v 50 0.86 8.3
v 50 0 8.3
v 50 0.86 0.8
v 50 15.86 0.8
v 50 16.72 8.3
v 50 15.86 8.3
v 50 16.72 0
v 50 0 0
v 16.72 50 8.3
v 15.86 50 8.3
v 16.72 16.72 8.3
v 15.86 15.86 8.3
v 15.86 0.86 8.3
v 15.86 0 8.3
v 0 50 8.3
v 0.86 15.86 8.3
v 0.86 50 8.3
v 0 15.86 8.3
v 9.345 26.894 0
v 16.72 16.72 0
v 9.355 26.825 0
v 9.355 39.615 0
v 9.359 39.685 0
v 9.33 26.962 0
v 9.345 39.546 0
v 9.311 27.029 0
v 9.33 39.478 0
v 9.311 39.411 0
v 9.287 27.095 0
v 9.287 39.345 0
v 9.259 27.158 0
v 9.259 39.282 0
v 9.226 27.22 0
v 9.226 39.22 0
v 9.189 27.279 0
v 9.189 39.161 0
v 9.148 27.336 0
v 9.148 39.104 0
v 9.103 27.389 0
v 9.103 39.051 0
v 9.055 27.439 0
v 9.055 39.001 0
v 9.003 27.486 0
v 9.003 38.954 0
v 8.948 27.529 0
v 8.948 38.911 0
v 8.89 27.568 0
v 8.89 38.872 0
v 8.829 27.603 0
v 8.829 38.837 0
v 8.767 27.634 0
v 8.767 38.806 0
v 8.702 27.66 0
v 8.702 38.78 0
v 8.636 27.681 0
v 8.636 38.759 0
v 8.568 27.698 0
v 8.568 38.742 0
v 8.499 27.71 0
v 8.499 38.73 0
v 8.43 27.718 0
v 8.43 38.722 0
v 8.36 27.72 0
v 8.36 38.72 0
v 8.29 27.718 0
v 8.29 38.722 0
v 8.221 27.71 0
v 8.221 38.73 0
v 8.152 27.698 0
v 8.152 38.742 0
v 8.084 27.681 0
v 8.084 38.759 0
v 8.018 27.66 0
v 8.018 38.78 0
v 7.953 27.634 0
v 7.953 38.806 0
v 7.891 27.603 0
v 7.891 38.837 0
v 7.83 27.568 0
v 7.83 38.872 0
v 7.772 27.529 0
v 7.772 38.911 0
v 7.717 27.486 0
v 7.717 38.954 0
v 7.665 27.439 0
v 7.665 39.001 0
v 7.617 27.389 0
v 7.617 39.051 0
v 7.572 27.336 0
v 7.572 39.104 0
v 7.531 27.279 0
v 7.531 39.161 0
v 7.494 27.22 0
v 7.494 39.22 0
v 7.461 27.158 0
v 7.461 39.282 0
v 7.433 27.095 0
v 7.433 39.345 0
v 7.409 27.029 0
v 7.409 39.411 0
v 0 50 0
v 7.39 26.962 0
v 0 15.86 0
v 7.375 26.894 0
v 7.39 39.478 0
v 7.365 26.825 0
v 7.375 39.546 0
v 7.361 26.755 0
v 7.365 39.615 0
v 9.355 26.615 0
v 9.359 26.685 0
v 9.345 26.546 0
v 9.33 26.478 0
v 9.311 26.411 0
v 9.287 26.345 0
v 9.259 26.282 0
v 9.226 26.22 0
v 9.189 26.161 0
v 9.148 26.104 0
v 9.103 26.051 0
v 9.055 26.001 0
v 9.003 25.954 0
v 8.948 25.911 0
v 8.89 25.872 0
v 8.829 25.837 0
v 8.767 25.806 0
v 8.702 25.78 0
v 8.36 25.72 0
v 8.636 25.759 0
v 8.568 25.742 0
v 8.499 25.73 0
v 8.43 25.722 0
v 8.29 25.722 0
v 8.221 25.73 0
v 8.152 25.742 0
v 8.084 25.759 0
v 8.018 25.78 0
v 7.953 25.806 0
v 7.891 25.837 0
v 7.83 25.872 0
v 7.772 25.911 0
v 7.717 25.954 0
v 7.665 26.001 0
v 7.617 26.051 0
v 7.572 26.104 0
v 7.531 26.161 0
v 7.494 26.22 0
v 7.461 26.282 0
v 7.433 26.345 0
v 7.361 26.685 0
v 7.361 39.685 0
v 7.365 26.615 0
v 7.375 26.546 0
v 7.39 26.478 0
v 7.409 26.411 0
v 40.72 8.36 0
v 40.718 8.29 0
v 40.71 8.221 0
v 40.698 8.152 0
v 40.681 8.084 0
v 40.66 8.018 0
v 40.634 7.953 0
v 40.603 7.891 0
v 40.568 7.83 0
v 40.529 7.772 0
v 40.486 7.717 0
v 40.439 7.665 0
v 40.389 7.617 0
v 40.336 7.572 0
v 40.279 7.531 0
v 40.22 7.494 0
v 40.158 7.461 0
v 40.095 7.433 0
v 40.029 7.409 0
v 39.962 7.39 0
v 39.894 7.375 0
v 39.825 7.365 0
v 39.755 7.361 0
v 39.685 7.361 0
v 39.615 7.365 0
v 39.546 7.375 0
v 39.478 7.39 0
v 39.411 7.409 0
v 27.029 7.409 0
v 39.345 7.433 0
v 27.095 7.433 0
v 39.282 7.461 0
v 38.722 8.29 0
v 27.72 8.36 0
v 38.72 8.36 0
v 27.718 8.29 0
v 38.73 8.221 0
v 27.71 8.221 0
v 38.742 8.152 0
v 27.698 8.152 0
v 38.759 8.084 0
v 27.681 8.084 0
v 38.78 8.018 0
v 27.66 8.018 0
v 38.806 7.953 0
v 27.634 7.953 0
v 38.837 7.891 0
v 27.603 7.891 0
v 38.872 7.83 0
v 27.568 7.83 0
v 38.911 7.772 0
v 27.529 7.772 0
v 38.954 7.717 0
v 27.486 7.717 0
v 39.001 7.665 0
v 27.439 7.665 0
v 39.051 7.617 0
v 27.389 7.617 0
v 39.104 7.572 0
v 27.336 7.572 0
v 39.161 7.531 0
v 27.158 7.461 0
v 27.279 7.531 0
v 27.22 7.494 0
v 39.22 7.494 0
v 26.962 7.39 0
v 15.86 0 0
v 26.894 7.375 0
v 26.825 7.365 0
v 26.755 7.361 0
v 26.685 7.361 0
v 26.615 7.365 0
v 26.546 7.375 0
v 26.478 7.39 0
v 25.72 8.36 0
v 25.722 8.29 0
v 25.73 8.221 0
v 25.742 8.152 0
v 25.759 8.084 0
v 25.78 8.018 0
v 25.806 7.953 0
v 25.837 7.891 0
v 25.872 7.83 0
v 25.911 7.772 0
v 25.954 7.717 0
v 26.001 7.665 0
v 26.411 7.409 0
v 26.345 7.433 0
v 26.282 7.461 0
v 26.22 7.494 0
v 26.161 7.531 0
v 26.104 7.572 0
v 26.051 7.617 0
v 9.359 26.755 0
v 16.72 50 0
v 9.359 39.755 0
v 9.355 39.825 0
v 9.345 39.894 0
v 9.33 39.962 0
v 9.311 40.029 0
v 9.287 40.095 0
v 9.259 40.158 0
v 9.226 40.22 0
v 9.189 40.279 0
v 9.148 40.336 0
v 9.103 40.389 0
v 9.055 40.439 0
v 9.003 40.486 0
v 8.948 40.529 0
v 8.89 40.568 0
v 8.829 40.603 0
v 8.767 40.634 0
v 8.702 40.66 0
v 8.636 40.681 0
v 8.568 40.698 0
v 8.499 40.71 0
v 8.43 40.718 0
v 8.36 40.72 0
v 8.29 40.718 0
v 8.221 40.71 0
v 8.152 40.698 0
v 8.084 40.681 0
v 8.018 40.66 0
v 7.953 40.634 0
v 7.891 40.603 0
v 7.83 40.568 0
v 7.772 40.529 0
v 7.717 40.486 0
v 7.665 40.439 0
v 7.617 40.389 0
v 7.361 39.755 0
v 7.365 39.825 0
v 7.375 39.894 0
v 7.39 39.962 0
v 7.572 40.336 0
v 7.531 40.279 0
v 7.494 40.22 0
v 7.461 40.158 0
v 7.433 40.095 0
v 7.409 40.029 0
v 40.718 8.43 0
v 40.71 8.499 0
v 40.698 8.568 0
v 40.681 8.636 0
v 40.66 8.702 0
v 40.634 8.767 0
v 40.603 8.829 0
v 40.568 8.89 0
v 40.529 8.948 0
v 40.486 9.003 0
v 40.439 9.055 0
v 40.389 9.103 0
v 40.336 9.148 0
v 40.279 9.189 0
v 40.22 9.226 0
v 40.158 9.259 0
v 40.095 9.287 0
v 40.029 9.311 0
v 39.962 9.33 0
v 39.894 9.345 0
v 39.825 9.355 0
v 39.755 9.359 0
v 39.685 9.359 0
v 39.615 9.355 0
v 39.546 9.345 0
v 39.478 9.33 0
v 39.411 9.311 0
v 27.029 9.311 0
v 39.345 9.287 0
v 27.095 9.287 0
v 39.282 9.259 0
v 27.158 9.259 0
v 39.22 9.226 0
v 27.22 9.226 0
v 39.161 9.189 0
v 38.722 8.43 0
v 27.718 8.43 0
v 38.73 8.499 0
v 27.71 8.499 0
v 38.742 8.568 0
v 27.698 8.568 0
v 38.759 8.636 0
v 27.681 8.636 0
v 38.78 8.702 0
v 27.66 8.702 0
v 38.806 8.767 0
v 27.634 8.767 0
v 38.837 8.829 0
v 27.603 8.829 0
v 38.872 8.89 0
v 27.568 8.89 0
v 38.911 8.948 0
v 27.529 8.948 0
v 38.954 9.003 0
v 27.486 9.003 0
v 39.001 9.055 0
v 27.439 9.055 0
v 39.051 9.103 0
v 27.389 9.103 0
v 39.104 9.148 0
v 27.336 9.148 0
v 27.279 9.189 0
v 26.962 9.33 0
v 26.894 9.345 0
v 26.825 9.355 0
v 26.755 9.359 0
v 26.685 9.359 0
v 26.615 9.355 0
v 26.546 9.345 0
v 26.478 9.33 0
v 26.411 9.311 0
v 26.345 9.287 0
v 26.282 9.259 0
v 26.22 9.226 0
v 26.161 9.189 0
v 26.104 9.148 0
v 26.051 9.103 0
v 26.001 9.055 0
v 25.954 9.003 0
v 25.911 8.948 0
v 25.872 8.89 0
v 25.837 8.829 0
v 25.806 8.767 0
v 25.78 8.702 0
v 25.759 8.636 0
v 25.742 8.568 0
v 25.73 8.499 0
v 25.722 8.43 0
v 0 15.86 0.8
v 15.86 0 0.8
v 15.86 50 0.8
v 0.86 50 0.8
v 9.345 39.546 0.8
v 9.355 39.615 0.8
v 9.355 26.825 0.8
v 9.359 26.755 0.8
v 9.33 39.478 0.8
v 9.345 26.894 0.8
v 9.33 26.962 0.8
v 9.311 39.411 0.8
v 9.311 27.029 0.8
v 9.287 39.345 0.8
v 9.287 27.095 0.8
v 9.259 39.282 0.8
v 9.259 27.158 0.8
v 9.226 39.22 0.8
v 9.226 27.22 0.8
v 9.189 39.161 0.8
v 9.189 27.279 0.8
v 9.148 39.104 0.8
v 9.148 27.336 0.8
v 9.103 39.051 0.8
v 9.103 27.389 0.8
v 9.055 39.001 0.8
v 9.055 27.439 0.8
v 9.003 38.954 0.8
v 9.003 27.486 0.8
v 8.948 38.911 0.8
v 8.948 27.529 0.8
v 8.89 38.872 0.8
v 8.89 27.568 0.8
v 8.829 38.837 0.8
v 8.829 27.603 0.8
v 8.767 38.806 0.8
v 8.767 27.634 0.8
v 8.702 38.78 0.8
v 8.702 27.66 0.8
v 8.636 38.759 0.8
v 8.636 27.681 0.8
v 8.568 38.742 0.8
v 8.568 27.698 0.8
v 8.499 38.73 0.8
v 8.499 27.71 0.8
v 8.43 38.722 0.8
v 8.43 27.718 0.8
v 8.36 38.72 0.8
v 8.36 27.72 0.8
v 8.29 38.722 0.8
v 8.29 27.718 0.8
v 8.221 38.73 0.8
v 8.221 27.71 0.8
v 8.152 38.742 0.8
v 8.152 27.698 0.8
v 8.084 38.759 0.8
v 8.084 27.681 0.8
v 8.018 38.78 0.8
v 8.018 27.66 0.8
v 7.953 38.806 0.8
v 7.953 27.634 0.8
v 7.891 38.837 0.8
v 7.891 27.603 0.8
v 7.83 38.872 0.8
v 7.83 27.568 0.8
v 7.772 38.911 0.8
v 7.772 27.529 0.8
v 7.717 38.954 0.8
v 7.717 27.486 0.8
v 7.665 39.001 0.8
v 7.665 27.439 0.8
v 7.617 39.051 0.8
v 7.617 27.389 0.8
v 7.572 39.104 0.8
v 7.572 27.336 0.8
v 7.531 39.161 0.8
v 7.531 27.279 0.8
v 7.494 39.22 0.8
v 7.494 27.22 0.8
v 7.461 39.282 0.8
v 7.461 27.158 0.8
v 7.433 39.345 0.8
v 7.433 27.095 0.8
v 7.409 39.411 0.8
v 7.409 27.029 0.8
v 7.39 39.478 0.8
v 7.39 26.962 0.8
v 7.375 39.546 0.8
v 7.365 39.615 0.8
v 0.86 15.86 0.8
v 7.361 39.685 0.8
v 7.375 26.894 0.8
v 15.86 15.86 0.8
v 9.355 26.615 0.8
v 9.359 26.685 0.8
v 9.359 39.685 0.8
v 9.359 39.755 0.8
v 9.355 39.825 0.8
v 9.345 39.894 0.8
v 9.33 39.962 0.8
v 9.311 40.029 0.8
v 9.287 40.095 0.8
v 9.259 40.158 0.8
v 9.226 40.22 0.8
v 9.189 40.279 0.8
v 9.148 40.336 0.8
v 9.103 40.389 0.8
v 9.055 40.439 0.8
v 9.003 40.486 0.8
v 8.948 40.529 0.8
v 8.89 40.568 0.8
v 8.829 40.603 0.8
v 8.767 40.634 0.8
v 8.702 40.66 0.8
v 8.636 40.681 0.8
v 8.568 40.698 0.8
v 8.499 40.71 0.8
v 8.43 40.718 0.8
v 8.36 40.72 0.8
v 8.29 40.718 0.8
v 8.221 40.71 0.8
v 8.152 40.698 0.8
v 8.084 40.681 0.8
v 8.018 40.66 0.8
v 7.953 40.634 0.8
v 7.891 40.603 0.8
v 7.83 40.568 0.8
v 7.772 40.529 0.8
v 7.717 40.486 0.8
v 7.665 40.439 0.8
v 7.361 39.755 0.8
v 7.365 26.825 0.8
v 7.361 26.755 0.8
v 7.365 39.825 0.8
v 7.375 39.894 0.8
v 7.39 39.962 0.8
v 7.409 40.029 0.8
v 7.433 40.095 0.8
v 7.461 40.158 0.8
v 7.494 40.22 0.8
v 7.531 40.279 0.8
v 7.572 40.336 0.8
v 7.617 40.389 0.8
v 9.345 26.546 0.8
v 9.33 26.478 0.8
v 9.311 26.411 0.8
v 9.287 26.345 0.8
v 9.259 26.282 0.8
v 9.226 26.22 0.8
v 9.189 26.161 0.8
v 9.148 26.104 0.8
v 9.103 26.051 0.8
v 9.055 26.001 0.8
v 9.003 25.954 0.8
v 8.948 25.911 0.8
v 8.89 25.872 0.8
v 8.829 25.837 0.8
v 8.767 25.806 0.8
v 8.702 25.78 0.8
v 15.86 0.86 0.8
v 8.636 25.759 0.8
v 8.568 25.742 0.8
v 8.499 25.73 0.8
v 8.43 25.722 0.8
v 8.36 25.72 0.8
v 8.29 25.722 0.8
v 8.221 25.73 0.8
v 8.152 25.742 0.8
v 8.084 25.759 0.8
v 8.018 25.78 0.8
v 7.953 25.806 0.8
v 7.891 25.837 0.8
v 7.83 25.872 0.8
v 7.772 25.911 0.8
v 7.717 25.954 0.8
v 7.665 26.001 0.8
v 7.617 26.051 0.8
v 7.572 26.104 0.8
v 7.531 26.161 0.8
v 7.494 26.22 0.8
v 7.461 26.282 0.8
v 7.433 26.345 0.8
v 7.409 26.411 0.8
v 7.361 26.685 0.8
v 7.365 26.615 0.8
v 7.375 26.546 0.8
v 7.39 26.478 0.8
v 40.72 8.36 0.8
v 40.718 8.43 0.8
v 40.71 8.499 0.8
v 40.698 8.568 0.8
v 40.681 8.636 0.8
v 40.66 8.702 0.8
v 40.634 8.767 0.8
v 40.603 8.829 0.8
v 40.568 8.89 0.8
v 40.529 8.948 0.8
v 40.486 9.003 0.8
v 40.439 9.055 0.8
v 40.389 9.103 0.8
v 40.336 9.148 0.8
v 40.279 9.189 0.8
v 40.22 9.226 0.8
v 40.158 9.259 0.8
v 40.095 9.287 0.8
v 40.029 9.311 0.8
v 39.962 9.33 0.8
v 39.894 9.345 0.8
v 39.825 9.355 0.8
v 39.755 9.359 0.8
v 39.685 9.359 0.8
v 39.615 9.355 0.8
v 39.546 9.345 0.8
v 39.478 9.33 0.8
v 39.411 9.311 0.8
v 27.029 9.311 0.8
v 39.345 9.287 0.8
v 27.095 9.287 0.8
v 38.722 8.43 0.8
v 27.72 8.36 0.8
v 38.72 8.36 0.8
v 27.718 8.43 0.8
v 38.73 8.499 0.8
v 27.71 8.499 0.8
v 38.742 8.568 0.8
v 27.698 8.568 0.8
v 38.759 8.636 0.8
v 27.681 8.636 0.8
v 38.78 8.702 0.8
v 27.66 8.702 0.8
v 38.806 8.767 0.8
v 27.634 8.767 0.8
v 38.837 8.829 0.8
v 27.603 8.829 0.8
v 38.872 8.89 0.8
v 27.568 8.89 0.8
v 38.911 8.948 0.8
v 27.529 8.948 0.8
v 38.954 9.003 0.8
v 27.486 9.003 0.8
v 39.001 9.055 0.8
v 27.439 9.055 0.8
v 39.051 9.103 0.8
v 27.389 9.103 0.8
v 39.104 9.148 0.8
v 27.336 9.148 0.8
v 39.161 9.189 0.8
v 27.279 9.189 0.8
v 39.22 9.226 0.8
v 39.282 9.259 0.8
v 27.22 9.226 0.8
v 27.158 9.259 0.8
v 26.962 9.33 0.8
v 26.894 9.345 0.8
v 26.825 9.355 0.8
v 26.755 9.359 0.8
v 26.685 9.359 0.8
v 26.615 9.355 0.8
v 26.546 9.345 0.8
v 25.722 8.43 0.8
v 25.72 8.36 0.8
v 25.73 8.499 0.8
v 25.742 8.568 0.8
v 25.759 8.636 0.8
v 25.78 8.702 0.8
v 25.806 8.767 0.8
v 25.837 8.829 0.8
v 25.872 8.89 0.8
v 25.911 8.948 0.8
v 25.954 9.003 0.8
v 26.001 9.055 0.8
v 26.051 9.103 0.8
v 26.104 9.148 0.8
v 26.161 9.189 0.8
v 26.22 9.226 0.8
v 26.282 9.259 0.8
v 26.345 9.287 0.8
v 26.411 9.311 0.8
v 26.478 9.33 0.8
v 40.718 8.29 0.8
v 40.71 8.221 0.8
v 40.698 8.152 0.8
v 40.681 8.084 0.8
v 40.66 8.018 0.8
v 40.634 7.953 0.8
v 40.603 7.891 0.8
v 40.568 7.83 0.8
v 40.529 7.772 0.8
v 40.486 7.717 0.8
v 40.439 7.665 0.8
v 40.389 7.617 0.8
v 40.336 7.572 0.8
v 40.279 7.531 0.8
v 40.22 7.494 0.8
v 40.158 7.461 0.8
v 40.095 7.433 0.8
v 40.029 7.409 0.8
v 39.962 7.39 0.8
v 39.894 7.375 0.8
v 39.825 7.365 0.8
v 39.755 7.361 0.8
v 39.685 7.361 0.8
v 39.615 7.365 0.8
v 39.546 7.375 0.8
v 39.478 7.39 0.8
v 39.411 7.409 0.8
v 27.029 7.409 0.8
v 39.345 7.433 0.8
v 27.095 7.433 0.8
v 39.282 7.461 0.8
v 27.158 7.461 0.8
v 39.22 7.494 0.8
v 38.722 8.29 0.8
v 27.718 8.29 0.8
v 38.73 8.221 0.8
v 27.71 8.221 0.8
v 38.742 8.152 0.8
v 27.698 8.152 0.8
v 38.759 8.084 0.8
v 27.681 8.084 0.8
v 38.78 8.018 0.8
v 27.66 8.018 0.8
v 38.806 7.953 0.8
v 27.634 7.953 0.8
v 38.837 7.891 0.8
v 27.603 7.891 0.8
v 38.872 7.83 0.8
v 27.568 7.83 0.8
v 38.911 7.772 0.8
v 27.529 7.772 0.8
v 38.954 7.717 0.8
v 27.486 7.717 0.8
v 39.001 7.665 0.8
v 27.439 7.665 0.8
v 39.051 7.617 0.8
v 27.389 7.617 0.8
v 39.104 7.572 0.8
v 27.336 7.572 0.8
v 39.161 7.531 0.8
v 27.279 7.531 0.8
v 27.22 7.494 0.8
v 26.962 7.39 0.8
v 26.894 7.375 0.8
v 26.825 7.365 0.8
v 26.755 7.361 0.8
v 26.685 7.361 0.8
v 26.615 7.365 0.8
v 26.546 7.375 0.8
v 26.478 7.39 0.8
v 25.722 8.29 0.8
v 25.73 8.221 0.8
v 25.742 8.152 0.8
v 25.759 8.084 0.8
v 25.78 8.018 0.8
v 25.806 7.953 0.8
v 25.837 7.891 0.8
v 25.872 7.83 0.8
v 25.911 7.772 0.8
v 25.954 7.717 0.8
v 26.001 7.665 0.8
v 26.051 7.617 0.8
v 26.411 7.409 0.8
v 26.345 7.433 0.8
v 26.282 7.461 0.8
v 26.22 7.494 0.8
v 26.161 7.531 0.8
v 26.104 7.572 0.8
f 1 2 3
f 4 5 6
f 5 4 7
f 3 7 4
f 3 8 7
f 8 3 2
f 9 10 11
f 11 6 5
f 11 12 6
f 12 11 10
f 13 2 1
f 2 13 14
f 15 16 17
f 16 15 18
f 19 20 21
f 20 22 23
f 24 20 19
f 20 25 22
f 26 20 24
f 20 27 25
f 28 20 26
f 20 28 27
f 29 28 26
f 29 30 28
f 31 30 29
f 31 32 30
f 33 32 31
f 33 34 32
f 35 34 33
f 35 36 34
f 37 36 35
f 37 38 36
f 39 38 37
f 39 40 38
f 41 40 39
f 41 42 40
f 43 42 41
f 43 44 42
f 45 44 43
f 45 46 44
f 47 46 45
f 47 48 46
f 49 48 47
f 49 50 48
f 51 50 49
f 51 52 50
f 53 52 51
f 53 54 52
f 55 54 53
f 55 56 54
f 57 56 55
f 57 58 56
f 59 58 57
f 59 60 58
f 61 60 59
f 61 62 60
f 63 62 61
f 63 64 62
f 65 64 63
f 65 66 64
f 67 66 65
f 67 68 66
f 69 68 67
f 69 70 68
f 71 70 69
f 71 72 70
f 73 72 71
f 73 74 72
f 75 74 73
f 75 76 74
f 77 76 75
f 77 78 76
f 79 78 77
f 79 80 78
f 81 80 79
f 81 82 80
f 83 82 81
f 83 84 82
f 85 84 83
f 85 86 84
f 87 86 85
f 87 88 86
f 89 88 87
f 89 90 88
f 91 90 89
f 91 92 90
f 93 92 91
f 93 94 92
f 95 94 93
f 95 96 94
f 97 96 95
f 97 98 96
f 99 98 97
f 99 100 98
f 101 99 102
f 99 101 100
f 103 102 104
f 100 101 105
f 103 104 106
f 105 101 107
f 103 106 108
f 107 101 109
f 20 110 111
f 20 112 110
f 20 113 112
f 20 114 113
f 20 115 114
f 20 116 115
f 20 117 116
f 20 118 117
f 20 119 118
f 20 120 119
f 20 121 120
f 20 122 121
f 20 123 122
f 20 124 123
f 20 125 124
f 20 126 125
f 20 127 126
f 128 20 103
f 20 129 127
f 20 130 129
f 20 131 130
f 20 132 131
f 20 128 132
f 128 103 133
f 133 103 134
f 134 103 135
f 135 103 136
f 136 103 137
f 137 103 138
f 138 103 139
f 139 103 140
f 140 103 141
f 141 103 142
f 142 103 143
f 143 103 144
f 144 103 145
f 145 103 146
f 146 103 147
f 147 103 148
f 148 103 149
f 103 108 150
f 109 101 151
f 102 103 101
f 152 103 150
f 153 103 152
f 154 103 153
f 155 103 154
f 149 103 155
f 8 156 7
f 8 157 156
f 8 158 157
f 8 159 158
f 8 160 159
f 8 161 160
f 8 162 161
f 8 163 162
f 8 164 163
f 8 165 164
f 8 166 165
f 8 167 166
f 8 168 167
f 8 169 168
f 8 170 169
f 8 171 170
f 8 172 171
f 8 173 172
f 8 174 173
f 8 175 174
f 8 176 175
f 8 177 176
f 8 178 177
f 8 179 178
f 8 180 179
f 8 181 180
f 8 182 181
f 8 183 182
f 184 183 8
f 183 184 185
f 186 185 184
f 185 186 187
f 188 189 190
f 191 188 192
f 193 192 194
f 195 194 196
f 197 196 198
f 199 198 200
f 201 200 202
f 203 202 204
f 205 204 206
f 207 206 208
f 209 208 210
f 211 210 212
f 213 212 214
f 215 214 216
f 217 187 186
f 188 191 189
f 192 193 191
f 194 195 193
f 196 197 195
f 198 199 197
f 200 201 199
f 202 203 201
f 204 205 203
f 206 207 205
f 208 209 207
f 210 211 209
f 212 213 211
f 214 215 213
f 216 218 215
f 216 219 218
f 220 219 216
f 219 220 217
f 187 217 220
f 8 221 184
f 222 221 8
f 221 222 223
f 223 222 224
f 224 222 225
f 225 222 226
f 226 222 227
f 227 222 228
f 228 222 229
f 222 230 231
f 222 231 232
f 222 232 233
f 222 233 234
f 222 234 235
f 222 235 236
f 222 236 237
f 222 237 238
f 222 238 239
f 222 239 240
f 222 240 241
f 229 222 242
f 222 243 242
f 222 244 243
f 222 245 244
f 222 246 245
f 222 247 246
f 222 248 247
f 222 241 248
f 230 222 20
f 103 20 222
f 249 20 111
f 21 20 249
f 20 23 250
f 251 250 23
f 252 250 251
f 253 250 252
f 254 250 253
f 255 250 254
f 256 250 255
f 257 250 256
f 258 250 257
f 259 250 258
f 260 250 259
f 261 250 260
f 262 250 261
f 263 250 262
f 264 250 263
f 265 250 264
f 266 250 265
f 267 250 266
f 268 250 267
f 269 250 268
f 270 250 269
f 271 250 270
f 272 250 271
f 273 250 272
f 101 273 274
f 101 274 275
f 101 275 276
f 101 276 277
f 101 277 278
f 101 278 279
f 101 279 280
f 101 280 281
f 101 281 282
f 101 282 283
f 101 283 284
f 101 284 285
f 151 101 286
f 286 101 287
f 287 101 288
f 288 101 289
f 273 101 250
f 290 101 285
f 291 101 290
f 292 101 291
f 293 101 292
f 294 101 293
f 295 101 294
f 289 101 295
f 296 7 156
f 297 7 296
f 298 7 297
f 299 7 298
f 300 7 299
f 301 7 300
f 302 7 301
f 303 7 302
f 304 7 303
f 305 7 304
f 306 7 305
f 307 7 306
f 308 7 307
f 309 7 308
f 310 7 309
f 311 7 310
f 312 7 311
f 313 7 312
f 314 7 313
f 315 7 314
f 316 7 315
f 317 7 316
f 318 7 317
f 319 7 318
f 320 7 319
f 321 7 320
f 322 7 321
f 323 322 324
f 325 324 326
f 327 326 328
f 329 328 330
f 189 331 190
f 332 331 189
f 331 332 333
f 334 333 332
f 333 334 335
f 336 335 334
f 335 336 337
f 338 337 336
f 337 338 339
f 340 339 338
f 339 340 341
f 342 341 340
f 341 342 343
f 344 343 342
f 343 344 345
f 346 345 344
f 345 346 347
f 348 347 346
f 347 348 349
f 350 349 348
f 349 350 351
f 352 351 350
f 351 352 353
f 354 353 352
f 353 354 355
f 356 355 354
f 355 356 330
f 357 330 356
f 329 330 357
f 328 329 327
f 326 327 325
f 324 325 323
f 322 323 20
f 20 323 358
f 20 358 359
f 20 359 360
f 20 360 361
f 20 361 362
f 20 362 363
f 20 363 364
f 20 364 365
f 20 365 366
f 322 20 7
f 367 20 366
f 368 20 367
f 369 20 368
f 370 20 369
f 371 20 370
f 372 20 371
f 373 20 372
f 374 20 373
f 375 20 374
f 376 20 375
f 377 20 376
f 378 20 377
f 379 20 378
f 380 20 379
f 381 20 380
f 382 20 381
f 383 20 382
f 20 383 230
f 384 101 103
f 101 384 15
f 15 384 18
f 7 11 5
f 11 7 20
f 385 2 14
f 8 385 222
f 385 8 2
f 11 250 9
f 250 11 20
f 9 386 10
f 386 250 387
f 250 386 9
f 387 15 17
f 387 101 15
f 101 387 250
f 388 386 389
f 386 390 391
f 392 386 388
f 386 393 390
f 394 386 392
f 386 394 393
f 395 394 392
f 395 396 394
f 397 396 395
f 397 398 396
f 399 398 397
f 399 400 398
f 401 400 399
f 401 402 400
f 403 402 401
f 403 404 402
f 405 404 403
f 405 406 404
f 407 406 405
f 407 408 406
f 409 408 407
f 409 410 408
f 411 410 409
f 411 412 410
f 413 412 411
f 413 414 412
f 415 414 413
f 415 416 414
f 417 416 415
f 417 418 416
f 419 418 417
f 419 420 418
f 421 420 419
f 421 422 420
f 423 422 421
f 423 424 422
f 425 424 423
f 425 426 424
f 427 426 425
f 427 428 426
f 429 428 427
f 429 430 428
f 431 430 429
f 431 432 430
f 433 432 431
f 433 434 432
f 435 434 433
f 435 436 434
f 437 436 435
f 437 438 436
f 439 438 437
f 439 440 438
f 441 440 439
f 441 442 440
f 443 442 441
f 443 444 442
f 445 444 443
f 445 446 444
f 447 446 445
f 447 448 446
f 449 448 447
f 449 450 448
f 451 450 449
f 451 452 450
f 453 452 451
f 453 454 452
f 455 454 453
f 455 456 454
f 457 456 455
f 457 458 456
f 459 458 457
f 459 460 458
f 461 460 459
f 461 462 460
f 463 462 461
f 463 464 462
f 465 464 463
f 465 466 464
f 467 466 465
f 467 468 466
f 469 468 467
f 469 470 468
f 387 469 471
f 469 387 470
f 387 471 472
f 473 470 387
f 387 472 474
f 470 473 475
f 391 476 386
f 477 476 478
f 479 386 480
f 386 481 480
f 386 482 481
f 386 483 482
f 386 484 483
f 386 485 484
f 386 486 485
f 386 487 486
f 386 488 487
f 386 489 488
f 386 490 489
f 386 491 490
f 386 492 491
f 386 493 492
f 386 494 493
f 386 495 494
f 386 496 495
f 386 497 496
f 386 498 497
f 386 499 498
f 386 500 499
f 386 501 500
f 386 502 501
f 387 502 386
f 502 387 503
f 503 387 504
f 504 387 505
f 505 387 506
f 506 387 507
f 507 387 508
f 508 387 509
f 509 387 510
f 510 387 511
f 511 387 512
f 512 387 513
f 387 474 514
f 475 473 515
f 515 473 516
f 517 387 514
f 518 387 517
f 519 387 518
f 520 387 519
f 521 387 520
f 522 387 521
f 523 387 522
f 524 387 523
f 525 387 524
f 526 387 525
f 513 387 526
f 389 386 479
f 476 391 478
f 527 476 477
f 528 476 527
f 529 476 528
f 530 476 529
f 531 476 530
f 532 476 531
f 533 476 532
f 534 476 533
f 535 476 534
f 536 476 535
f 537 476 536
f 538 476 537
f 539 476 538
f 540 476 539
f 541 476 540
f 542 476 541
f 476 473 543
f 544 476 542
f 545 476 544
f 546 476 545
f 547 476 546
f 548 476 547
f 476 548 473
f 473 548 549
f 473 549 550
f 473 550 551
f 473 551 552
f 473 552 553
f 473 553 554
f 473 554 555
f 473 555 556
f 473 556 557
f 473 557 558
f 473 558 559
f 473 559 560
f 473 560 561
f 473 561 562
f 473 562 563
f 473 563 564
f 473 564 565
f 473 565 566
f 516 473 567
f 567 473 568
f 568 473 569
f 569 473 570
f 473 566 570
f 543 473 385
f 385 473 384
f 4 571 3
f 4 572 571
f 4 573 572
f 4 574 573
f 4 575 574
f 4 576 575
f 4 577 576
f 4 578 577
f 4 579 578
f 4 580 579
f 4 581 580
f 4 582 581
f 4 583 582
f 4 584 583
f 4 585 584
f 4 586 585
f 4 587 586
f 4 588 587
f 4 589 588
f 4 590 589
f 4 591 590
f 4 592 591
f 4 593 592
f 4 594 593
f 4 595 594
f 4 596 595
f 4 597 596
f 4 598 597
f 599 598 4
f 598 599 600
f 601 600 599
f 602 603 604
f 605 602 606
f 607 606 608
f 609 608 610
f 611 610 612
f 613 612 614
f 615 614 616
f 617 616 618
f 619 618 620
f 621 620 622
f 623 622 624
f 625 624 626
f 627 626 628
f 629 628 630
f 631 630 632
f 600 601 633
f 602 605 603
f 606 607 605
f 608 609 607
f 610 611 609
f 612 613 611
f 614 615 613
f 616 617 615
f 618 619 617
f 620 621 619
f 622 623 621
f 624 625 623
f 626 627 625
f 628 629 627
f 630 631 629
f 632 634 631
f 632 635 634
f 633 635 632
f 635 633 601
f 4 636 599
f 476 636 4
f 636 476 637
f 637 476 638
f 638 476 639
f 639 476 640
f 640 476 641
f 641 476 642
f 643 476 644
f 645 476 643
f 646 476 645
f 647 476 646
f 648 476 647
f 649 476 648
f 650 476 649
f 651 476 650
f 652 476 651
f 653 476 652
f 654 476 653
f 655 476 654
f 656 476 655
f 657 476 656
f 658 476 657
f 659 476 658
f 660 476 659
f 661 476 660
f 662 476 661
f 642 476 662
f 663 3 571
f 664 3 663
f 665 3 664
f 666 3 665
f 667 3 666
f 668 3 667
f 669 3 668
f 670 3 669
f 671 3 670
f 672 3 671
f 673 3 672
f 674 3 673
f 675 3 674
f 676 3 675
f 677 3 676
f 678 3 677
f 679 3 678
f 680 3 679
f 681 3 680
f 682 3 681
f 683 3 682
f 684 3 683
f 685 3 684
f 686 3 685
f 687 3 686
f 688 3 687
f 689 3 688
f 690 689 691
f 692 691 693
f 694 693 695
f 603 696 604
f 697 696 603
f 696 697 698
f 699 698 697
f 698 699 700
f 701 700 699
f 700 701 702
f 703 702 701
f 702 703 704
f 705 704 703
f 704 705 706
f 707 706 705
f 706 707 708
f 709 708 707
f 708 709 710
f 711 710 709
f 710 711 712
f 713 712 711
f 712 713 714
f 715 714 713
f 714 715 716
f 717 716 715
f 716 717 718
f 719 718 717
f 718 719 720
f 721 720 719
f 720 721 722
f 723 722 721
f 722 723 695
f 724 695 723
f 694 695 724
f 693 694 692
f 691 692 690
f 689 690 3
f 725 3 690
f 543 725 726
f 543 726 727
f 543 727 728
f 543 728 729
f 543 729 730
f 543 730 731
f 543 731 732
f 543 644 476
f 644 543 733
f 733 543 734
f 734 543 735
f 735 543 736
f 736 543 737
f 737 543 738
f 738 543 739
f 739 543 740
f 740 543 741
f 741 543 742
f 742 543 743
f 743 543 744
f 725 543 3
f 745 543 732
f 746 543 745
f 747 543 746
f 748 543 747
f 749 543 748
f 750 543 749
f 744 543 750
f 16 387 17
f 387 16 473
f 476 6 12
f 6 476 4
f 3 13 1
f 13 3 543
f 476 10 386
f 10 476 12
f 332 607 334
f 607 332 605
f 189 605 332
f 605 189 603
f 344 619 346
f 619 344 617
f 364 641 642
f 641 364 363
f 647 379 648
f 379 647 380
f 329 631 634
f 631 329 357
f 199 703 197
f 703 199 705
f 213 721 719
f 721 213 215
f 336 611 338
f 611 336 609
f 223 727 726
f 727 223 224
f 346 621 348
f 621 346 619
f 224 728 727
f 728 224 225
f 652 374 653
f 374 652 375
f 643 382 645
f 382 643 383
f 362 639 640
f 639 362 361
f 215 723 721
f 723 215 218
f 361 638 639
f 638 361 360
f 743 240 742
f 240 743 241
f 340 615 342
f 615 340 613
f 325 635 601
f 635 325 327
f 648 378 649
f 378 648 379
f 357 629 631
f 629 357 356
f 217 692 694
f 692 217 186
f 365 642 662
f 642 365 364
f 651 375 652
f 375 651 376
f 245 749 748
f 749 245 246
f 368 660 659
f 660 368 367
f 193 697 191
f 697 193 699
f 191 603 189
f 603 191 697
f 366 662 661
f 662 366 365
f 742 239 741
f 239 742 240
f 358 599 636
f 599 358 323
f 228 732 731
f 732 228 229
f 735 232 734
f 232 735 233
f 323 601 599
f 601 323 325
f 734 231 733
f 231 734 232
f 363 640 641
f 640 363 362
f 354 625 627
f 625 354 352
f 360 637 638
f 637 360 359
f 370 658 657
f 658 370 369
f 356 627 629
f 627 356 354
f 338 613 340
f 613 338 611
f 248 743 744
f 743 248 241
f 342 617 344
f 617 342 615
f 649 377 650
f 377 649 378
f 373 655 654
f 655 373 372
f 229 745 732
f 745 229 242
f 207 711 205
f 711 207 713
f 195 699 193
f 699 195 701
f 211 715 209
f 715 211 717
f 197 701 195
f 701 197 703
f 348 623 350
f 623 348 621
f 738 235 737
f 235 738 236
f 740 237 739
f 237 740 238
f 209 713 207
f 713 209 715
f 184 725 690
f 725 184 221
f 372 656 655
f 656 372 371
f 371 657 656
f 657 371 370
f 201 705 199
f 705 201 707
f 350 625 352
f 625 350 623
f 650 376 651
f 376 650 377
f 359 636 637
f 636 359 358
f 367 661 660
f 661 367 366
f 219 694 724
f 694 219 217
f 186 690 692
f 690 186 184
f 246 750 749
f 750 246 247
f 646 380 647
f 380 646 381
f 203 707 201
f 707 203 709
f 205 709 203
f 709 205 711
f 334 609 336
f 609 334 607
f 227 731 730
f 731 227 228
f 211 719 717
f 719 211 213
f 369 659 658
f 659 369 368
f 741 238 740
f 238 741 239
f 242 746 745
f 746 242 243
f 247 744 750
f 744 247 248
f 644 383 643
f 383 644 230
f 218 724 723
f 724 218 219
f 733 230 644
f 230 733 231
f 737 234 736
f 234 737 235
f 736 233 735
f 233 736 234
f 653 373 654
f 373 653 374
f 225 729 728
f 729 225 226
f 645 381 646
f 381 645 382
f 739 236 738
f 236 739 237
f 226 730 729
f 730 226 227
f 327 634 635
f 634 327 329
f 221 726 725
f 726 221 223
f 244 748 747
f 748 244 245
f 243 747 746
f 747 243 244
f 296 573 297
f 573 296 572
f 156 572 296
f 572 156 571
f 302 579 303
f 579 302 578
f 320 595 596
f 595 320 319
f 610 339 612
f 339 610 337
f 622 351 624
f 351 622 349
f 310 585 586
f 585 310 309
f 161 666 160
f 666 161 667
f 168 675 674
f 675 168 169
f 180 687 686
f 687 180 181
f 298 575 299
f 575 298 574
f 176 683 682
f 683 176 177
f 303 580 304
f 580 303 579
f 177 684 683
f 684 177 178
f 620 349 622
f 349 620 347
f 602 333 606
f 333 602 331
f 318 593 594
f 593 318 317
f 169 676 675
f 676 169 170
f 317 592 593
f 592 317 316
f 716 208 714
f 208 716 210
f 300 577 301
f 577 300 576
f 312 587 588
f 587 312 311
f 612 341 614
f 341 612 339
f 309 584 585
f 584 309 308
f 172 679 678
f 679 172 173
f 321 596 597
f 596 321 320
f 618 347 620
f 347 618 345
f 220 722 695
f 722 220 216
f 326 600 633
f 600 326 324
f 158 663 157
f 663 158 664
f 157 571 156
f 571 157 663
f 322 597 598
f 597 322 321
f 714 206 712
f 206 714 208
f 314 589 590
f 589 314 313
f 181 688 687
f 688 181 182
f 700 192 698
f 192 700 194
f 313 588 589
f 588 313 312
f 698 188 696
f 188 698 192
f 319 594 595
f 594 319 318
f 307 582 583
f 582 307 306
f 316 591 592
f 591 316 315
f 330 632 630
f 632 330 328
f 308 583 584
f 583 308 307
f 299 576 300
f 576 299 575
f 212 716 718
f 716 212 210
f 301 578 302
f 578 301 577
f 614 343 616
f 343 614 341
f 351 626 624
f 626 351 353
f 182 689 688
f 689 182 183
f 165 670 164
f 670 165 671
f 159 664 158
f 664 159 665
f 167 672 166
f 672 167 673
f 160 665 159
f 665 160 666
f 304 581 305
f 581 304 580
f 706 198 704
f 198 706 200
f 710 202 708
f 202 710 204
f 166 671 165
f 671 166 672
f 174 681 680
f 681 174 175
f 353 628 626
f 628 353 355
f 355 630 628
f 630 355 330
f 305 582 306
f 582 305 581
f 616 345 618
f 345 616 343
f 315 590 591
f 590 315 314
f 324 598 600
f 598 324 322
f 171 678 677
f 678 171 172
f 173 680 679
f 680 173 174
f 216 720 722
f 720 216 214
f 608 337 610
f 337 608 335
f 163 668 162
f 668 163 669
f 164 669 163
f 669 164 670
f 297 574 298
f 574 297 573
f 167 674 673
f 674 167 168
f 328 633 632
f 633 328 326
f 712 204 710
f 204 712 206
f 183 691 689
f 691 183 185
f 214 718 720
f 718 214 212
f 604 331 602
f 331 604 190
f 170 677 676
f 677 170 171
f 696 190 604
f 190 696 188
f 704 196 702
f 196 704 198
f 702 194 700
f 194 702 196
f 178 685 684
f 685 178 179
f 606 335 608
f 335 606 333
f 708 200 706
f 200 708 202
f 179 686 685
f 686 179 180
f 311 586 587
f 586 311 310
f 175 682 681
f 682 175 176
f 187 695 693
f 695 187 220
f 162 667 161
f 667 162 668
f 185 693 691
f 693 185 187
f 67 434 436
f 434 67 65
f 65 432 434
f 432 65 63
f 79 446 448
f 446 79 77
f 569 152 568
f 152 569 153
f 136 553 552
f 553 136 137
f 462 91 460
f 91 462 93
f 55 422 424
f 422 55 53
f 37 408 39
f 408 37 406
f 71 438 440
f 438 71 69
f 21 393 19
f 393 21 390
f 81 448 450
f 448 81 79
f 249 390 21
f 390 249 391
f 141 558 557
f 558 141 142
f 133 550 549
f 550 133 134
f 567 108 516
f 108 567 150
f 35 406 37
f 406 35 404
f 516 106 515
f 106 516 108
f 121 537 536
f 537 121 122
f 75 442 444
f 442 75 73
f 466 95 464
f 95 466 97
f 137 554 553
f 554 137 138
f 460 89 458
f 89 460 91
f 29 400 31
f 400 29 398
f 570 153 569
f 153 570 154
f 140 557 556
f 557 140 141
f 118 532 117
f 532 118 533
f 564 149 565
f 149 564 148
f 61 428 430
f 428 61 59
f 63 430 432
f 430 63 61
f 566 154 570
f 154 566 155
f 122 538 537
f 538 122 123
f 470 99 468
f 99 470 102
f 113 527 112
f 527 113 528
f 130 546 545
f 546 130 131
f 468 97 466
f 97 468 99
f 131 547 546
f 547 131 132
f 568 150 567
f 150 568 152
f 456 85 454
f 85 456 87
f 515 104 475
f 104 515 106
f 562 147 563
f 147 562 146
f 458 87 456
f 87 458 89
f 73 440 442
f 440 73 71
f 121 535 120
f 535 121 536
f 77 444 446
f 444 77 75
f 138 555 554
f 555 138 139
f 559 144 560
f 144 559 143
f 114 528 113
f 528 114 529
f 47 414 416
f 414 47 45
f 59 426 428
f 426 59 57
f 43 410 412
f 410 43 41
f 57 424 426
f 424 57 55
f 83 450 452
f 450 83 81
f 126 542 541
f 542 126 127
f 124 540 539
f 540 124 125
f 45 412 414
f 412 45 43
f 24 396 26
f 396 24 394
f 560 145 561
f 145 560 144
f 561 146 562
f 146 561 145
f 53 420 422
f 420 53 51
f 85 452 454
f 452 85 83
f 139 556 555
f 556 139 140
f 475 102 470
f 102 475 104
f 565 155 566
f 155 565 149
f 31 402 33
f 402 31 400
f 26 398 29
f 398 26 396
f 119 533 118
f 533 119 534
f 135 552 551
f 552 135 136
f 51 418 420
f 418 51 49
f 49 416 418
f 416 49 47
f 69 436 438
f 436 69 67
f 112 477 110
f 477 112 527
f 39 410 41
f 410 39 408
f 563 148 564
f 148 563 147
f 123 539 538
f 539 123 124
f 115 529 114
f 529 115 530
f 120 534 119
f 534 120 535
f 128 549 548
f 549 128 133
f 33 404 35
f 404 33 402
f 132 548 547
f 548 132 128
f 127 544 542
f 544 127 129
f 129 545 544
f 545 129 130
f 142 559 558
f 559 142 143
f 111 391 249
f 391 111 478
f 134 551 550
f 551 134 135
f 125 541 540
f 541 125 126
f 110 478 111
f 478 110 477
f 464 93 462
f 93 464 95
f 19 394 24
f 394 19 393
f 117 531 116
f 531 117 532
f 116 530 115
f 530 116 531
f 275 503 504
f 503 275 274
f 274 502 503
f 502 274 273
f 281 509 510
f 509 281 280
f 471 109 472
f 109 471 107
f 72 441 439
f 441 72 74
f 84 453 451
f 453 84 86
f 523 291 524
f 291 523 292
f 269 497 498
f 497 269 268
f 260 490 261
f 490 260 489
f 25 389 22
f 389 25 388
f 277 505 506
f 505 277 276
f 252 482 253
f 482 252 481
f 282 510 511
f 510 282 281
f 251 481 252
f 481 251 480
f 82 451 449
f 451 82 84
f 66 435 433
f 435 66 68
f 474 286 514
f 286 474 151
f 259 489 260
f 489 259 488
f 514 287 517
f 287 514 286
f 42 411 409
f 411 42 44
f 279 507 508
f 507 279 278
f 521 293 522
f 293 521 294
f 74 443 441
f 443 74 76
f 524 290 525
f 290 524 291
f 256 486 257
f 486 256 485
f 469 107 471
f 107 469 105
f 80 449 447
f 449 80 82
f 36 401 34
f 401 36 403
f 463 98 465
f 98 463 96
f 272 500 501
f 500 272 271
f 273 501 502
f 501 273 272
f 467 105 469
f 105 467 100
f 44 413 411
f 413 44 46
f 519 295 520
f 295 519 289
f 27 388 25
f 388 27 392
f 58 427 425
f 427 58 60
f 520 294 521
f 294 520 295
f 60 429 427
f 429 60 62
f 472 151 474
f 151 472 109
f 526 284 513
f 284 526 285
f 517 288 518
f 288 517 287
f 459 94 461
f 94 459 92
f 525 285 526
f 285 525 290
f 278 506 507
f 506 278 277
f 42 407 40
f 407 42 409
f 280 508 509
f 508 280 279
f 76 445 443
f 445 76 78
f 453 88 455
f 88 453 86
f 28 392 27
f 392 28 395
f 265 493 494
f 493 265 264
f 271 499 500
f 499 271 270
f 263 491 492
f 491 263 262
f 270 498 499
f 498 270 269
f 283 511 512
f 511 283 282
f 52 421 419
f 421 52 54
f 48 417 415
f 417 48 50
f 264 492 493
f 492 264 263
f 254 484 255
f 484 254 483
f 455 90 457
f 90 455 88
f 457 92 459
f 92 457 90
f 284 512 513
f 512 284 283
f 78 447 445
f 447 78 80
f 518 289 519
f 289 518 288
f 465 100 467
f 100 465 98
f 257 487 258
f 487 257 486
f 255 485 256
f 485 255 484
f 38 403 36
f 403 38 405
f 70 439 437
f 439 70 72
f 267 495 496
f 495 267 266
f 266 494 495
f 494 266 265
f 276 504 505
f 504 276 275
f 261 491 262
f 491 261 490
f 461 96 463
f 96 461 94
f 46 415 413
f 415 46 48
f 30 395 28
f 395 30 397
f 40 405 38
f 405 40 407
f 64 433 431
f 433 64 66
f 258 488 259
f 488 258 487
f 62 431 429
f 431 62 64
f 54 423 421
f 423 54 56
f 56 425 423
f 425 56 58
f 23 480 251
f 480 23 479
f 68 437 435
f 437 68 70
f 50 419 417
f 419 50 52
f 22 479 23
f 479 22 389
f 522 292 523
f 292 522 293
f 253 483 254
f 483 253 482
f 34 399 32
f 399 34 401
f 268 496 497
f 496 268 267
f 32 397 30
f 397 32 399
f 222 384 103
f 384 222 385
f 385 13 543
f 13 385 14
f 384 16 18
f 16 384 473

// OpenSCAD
/*
 * Corner Connector U-Profile (parametric)
 *
 * Author: Pavel Rampas
 * Version: 1.0.0 (Changelog is at the bottom)
 * License: CC BY-SA 4.0 [https://creativecommons.org/licenses/by-sa/4.0/]
 * Link: https://github.com/pavelrampas/openscad-models
 *
 * OpenSCAD version: 2019.05
 *
 * Instructions:
 * Set up parameters, render and print.
 *
 * Height is layer.
 * Thickness is perimeter.
 */

// Parameters
//------------------------------------------------------------------------------

$fn = $preview ? 15 : 90;

sizeA = 15; // profile size A (width)
sizeB = 15; // profile size B (height)

thickness = 0.86; // print wall thickness
height = 0.8; // print bottom part height

length = 50; // length to angle centre

holeDiameter = 2; // holes diameter
holeSpace = 11; // space between holes

cutCorner = true; // cut corner ("true" or "false")

supportingCorner = false; // enable supporting corner ("true" or "false")
cornerHoleDiameter = 3; // hole diameter in supporting corner

// Code
//------------------------------------------------------------------------------

// u-profile with or without corner
if (cutCorner) {
    difference() {
        _profileWithHoles();
        _cornerCube();
        translate([0, 0, height]) {
            cube([sizeA + thickness, sizeA + thickness, sizeB], center = false);
        }
    }

} else  {
    _profileWithHoles();
}

// supporting corner
if (supportingCorner) {
    difference() {
        // corner
        translate(
            [(sizeA * 2) + (2 * thickness), (sizeA * 2) + (2 * thickness), 0]
        ) {
            rotate(a = [0, 0, 180]) {
                difference() {
                    cube(
                        [sizeA + thickness, sizeA + thickness, height],
                        center = false
                    );
                    _cornerCube();
                }
            }
        }
        // hole
        holePosition = sizeA + (2 * thickness) + (sizeA / 3.5);
        translate([holePosition, holePosition, -1]) {
            cylinder(
                h = height + 2,
                d1 = cornerHoleDiameter,
                d2 = cornerHoleDiameter,
                center=false
            );
        }
    }
}

// Functions
//------------------------------------------------------------------------------


// Modules
//------------------------------------------------------------------------------

// u-profile with holes
module _profileWithHoles() {
    difference() {
        _profile();
        _holes();
        translate([sizeA + (2 * thickness), 0, 0]) {
            rotate(a = [0, 0, 90]) {
                _holes();
            }
        }
    }
}

// holes
module _holes() {
    holesStartAt = (sizeA + (2 * thickness) + (sizeA / 1.5));
    holeWithSpace = holeSpace + holeDiameter;
    holes = floor(((length + holeSpace) - holesStartAt) / holeWithSpace) - 1;
    for (i = [0 : holes]) {
        translate([
            holesStartAt + (holeWithSpace * i),
            (sizeA + (2 * thickness)) / 2,
            -1
        ]) {
            cylinder(
                h=height + 2,
                d1=holeDiameter,
                d2=holeDiameter,
                center=false
            );
        }
    }
}

// u-profile
module _profile() {
    difference() {
        union() {
            // x-axis
            cube(
                [length, sizeA + (2 * thickness), height + (sizeB / 2)],
                center = false
            );
            // y-axis
            cube(
                [sizeA + (2 * thickness), length, height + (sizeB / 2)],
                center = false
            );
        }

        union() {
            // x-axis
            translate([thickness, thickness, height]) {
                cube(
                    [length + 1, sizeA, sizeB],
                    center = false
                );
            }
            // y-axis
            translate([thickness, thickness, height]) {
                cube(
                    [sizeA, length + 1, sizeB],
                    center = false
                );
            }
        }
    }
}

// cube to cut corner
module _cornerCube() {
    rotate(a = [0, 0, 45]) {
        cube(sqrt(pow(sizeA + thickness, 2) * 2), center = true);
    }
}

// Changelog
//------------------------------------------------------------------------------

// [1.0.0]:
// Initial release.
